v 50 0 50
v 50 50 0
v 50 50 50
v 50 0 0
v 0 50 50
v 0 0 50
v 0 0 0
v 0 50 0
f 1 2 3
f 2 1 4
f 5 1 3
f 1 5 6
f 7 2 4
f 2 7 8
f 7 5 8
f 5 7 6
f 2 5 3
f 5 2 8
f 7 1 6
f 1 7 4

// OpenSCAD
cube([50,50,50]);
color("black") {
    translate([25,25,0]) {
        cylinder(d=5, h=50);
    }
}
